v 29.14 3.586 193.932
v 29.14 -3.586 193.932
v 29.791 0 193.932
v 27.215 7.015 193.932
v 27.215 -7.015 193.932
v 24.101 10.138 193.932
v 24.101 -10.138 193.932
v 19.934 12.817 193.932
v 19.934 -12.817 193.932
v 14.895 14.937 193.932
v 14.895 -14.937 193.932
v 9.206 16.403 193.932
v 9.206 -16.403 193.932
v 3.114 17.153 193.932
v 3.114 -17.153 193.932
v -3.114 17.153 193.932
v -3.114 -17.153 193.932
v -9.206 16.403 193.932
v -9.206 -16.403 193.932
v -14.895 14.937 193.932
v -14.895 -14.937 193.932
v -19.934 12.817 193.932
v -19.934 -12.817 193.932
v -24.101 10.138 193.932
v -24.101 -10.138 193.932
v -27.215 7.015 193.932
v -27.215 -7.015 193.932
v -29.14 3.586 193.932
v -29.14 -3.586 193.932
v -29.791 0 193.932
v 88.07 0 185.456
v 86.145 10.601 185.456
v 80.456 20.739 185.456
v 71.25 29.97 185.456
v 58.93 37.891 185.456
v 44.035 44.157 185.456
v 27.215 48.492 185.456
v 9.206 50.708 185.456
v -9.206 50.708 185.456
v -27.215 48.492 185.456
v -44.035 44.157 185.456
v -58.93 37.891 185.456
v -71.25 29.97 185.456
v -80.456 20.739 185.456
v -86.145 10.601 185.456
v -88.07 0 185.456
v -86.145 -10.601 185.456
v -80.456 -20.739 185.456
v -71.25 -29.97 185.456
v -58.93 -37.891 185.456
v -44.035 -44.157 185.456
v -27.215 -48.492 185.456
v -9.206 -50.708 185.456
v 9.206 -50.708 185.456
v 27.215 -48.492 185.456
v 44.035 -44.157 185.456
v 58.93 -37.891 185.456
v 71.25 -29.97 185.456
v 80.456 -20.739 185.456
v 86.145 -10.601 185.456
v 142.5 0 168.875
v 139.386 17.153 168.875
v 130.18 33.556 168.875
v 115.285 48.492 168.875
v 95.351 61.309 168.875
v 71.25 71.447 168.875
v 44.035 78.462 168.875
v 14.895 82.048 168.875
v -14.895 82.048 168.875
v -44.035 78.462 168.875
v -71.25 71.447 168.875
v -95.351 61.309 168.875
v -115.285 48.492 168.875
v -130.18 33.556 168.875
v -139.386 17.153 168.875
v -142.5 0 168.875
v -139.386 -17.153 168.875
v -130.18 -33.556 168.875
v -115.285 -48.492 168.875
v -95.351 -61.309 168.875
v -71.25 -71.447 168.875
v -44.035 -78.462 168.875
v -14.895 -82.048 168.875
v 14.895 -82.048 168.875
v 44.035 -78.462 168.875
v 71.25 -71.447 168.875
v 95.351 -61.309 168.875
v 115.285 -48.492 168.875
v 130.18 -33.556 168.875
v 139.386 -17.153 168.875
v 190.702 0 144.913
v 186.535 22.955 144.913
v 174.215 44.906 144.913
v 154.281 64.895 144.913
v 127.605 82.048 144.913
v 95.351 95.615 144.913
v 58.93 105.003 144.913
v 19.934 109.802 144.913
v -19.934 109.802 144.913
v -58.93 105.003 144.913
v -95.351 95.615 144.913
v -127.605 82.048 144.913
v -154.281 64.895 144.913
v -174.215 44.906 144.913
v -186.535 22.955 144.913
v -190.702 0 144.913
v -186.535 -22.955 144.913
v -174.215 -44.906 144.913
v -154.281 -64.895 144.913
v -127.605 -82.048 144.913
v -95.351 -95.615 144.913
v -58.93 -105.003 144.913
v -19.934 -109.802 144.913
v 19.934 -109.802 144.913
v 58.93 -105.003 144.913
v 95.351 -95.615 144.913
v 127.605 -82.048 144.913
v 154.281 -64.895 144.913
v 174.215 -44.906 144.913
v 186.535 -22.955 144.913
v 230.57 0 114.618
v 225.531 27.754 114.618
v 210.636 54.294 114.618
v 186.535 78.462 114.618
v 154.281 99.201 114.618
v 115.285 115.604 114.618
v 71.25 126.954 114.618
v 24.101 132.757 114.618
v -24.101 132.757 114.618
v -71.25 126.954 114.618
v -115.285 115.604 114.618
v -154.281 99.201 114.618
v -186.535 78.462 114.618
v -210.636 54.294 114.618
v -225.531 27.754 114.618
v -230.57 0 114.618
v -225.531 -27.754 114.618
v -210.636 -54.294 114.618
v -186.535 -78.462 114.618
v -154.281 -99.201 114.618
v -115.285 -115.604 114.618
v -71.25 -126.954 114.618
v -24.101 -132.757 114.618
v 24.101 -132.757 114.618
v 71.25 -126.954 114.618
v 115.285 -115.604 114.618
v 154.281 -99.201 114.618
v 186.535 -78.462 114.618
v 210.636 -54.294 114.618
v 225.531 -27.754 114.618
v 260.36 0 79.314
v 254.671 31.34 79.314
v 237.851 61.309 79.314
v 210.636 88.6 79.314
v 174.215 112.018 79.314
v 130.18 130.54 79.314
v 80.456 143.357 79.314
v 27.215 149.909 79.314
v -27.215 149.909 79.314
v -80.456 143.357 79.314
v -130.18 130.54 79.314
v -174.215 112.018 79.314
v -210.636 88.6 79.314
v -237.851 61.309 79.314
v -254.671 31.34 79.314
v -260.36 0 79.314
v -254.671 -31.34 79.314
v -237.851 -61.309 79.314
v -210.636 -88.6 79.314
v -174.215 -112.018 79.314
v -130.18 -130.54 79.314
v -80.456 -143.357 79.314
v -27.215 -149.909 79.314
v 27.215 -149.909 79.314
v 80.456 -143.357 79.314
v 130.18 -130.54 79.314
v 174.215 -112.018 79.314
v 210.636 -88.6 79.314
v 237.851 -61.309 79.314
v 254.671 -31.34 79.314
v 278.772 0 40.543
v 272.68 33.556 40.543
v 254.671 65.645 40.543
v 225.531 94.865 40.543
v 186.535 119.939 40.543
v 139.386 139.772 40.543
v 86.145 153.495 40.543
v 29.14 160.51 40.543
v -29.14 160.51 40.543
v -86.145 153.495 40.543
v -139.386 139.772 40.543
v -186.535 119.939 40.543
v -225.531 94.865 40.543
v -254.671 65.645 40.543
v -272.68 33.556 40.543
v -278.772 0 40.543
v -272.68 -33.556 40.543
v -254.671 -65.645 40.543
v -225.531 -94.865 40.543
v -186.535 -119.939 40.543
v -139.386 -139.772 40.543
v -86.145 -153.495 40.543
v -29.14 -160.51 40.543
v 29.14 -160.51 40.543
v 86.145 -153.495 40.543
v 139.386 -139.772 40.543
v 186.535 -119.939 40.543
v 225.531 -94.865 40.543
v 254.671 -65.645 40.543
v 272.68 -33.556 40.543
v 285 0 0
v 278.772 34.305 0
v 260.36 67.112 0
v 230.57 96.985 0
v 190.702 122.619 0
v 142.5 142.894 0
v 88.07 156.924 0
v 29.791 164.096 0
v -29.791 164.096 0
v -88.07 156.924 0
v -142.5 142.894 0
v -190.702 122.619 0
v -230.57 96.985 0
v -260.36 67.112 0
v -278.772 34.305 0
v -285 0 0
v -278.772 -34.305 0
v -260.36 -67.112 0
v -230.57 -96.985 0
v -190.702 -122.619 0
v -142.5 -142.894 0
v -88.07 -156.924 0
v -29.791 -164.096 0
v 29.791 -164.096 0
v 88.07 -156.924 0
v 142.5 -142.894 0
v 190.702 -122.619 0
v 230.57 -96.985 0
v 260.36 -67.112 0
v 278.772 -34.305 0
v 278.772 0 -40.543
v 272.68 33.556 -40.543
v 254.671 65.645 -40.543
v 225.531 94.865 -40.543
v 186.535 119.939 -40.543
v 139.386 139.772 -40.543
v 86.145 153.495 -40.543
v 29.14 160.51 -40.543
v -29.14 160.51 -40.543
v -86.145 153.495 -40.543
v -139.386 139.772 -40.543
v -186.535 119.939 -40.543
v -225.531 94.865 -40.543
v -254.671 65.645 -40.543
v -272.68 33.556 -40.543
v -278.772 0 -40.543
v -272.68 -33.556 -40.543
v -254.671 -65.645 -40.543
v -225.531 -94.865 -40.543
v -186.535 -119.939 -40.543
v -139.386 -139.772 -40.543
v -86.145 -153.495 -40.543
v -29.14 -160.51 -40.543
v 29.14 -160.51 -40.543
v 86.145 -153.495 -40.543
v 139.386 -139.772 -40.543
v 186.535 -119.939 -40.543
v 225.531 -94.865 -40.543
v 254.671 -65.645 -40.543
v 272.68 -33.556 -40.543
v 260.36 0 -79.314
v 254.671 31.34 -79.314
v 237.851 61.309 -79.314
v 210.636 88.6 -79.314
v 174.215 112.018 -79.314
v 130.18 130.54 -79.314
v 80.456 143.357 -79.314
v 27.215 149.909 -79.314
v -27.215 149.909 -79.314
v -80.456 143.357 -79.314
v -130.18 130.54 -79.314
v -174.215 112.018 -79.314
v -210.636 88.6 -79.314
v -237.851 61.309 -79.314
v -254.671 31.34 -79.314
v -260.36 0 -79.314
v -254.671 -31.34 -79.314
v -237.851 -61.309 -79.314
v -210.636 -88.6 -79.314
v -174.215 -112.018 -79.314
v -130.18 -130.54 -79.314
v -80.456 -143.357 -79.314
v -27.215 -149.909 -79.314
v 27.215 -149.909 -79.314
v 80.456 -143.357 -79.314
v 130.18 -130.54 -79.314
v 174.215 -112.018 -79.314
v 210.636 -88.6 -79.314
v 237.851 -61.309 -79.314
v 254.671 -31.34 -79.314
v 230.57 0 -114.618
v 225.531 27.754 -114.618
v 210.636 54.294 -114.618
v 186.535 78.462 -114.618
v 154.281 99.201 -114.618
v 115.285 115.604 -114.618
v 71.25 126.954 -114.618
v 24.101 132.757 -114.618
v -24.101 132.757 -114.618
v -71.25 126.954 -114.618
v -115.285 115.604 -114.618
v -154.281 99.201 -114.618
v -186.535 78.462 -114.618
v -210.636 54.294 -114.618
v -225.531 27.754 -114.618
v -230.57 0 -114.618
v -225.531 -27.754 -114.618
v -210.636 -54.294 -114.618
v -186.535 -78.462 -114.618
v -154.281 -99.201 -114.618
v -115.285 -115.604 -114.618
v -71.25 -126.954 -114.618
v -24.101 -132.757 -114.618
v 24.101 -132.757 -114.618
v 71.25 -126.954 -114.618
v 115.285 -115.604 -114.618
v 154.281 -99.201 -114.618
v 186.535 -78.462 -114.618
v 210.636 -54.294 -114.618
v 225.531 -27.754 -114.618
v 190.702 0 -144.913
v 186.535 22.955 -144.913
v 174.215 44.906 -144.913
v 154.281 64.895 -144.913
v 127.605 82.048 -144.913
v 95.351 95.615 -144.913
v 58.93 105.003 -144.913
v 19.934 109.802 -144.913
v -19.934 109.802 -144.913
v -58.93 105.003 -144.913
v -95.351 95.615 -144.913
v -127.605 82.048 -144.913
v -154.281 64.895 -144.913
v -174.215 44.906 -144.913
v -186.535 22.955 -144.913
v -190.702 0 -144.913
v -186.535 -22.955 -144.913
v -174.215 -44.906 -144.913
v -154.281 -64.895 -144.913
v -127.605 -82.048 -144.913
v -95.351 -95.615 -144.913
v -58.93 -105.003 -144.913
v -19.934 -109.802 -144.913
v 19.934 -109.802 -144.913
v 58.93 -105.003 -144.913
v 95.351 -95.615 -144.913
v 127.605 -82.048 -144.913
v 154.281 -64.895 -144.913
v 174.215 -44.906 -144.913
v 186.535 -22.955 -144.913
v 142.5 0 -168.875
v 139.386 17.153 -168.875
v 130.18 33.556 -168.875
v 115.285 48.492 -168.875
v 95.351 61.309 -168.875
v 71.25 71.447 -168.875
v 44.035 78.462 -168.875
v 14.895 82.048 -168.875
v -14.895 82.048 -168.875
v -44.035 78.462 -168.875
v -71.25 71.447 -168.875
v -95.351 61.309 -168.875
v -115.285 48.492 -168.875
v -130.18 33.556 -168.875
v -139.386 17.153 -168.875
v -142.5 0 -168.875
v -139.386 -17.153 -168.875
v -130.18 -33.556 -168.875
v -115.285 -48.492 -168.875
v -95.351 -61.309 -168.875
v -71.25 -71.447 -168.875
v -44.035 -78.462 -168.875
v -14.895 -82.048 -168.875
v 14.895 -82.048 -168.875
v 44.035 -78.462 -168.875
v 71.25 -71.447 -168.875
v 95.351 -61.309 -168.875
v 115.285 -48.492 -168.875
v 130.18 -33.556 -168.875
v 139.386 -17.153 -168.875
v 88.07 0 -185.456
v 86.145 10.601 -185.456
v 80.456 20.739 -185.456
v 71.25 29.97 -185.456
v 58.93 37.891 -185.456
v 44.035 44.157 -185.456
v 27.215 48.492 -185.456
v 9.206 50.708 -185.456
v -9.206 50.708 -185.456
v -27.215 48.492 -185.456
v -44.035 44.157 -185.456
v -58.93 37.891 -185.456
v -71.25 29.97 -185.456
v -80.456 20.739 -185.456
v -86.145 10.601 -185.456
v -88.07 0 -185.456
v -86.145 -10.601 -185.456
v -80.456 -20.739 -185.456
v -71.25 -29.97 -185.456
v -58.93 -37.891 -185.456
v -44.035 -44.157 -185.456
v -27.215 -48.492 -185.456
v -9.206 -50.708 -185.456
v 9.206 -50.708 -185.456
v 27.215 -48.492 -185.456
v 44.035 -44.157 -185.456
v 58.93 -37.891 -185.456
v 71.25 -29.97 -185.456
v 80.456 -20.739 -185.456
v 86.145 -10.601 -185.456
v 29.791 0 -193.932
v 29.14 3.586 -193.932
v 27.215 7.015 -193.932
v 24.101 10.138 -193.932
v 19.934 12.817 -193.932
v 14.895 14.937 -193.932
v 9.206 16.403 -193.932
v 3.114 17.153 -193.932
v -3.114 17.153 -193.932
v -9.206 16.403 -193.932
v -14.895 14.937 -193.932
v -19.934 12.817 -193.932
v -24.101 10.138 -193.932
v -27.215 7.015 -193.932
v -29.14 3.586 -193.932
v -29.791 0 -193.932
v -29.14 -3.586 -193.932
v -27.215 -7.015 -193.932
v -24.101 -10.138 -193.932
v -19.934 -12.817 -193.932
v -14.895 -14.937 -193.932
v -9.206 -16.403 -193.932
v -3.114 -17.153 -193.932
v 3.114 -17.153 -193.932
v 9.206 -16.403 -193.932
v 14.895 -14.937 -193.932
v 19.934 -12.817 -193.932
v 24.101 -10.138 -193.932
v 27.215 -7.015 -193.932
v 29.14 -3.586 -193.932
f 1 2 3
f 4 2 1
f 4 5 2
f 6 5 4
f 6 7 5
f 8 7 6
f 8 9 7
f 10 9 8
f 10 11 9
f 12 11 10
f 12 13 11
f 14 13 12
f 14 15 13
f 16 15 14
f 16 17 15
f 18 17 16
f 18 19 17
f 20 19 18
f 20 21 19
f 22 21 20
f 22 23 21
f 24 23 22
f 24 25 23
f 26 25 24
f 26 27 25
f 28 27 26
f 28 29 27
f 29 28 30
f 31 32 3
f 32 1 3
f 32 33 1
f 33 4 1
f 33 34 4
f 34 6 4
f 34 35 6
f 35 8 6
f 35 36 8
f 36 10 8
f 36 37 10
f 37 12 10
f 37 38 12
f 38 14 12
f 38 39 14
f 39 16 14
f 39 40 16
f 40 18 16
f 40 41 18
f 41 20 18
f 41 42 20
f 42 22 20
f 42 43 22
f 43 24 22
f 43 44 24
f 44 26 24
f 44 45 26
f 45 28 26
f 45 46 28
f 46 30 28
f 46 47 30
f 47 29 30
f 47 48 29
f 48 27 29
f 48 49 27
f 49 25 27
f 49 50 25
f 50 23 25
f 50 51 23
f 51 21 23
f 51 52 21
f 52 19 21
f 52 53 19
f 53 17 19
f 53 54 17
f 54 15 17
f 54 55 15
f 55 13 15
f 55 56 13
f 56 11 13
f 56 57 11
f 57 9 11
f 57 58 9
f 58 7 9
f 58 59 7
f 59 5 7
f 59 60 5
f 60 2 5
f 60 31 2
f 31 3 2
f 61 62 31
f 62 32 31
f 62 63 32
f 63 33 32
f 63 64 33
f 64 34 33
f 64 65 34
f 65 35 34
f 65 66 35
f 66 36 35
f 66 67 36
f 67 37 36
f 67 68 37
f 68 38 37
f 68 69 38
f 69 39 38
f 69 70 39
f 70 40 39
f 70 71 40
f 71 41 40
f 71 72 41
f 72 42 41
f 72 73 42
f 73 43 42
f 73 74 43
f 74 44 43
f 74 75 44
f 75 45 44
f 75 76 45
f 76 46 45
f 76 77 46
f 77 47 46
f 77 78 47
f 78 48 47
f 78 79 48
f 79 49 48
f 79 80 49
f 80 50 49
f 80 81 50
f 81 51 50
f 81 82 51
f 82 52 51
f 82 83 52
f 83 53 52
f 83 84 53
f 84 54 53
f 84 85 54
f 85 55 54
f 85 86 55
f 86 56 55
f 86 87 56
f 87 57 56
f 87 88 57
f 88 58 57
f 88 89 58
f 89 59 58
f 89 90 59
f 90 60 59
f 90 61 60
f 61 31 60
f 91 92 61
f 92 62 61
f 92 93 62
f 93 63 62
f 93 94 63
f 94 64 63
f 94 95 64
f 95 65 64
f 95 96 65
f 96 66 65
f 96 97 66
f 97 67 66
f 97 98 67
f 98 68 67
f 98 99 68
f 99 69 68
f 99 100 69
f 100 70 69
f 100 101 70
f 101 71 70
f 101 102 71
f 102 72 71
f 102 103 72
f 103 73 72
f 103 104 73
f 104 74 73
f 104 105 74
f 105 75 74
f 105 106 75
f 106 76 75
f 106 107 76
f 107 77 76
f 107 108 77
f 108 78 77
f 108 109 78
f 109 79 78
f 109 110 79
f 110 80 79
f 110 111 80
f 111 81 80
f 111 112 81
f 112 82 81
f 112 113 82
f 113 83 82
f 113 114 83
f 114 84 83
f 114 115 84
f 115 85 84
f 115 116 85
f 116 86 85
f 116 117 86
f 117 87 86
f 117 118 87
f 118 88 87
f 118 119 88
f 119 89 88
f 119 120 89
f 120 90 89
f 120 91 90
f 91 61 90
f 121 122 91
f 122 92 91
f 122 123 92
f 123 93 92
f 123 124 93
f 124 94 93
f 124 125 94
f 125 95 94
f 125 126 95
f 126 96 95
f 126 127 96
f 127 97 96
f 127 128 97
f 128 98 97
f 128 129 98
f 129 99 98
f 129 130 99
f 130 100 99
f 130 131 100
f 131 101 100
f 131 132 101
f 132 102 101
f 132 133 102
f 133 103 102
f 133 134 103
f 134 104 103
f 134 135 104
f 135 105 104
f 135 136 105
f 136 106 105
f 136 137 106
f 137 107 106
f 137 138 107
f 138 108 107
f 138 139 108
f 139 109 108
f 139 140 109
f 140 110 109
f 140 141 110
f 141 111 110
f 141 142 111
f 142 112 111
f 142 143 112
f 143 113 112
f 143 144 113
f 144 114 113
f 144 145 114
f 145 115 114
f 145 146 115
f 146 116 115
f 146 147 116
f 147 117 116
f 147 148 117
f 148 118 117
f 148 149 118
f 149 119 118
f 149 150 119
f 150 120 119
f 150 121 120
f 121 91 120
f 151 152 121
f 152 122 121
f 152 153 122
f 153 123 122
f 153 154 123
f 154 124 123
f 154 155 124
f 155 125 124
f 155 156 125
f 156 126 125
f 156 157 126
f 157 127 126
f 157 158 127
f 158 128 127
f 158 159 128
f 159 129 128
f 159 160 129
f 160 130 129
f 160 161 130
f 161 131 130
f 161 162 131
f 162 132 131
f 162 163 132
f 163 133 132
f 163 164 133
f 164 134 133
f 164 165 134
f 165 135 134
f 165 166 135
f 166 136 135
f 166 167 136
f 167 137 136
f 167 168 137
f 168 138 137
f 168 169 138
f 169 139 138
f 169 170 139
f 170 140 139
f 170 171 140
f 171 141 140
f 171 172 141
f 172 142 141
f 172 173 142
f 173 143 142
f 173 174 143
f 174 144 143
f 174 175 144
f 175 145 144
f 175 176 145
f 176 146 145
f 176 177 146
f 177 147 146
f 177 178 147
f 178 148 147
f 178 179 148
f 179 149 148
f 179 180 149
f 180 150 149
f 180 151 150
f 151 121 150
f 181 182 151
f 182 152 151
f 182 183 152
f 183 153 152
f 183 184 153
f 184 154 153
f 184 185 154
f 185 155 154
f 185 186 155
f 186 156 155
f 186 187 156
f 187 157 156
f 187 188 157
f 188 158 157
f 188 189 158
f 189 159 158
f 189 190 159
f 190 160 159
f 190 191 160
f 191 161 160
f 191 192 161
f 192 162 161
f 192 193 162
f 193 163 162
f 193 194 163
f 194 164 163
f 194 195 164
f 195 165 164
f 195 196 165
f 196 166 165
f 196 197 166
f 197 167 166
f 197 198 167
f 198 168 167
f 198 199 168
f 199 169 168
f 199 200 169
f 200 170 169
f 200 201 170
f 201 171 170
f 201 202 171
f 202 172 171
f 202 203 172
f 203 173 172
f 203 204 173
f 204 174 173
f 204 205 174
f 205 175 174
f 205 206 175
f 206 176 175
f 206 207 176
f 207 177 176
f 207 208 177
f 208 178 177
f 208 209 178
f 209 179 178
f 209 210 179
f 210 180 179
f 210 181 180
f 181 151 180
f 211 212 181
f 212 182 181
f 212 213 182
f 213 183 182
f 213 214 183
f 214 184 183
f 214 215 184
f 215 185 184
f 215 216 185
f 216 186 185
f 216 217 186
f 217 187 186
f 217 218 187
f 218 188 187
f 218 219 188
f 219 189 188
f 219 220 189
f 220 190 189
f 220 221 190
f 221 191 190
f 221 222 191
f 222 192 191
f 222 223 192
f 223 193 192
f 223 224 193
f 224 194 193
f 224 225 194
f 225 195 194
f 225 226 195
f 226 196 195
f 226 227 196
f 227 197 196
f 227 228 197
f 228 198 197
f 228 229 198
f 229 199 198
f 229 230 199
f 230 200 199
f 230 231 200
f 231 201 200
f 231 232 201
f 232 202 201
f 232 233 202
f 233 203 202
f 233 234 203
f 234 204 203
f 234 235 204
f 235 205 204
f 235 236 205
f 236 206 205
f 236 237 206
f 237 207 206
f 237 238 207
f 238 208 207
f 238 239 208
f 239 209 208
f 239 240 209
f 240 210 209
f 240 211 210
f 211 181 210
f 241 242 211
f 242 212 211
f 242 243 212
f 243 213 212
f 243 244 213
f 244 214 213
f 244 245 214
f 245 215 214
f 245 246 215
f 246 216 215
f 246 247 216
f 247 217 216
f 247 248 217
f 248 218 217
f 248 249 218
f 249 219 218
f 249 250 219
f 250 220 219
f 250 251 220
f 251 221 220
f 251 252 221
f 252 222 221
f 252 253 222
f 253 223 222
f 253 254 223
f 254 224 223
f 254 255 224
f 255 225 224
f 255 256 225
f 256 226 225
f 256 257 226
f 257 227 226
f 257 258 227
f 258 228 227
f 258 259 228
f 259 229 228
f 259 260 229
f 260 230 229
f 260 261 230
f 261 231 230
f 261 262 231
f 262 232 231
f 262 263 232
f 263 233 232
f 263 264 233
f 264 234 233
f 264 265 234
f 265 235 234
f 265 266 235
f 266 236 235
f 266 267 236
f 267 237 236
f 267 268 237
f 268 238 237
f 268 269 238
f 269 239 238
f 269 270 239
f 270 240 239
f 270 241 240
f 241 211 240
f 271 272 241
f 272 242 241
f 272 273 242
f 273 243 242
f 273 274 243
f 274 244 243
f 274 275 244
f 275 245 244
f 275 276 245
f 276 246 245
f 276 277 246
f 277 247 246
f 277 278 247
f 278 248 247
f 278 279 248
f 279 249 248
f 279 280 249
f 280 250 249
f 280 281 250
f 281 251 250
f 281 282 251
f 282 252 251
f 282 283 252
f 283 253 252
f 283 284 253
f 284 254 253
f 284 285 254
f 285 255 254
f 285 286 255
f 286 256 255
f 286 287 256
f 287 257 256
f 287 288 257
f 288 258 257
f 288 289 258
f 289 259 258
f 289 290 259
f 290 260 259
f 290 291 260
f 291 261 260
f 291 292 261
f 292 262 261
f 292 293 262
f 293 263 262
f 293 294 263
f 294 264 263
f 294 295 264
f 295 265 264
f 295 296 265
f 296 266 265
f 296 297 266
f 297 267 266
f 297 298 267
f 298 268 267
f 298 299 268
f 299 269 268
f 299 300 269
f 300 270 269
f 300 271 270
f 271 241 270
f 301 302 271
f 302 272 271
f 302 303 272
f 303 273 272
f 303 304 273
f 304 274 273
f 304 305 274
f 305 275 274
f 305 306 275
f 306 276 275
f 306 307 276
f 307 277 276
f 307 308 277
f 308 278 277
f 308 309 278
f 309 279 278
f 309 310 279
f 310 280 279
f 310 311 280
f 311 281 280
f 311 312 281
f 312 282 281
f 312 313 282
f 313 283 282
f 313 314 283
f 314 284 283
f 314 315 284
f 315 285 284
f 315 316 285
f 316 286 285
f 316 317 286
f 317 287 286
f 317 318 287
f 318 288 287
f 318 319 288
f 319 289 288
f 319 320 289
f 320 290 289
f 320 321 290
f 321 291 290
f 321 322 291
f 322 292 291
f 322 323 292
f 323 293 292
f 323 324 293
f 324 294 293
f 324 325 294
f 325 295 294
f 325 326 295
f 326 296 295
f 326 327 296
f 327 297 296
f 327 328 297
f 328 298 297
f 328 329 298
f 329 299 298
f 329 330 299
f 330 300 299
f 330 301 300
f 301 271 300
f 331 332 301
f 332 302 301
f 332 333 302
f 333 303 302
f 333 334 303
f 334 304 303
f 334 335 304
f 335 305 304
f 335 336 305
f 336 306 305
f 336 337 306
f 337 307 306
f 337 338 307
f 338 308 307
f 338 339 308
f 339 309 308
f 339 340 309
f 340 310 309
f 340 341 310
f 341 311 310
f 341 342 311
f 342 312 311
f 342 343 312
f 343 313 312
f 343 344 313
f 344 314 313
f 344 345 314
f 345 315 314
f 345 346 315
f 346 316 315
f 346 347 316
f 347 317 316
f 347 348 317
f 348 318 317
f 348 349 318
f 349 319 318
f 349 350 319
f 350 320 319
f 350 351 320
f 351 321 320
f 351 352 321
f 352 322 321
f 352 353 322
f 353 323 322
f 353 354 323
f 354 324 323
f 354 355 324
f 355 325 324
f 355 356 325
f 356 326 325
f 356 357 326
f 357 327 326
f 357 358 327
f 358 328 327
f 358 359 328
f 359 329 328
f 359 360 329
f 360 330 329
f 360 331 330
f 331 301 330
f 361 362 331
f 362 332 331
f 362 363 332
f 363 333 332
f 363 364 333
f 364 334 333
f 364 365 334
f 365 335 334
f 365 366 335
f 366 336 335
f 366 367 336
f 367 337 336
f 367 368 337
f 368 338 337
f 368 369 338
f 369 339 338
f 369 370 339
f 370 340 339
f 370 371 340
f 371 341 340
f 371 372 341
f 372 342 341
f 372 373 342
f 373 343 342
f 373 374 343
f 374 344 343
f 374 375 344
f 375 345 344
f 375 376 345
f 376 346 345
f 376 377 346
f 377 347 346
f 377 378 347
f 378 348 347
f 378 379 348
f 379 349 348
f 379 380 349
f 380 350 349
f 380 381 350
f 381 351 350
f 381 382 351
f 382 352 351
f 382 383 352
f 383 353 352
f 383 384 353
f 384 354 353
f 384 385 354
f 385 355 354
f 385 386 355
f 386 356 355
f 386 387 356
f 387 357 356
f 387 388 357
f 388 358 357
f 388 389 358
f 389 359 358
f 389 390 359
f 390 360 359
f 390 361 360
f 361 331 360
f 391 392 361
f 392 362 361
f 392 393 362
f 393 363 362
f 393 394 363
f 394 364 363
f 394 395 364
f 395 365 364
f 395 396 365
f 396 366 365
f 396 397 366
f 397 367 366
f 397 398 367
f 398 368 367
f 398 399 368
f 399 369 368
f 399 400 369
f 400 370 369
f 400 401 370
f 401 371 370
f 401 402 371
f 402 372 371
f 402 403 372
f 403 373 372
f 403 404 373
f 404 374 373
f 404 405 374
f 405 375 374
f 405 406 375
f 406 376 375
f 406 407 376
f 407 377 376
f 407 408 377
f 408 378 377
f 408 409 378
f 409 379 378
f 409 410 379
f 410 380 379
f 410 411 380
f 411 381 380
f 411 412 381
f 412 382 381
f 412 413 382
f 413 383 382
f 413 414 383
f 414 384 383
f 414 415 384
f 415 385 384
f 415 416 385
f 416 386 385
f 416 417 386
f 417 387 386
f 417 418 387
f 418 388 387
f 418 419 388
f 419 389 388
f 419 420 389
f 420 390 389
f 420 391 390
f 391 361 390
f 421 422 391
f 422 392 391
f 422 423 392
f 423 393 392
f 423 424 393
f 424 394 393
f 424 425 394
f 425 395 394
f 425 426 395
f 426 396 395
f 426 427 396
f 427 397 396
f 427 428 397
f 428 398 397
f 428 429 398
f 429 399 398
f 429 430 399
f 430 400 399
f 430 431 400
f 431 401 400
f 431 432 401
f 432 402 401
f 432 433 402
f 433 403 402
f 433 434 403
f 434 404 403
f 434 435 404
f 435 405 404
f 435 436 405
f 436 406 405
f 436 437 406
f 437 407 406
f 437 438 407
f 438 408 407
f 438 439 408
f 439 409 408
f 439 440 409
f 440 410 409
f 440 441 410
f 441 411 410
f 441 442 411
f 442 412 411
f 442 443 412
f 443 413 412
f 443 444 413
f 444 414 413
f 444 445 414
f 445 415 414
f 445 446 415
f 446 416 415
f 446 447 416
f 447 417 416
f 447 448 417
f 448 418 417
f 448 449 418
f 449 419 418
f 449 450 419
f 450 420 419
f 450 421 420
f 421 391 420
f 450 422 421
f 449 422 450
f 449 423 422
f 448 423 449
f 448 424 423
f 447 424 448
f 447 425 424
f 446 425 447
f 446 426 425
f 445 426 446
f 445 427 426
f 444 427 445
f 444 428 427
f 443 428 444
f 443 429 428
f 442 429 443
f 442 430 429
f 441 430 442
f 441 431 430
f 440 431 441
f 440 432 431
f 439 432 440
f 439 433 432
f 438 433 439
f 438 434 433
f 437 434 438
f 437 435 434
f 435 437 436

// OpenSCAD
// Generated by SolidPython 1.0.1 on 2020-07-29 00:46:54


scale(v = [19, 11, 13]) {
	sphere(r = 15);
}
/***********************************************
*********      SolidPython code:      **********
************************************************
 
# import packages: SolidPython
from solid import *
from solid.utils import *
from itertools import chain, combinations, permutations


class Resize:

    def __init__(self, scad_file):
        self.scad_file = scad_file
        #self.scad_file = import_scad(scad_file)
        # cone/cylinder param:
        self.r1 = 0
        self.r2 = 0
        self.h = 0
        # rectangular prism param:
        self.w = 0
        self.l = 0
        # ellipse param:
        self.r = 0

    # import OpenScad code (file name corresponds to shape)


    # classify shape + parameters
    def assign(self, param1, param2, param3):
        if self.scad_file == 'cone.scad':
            self.r1 = param1
            self.r2 = param2
            self.h = param3
        elif self.scad_file == 'cylinder.scad':
            self.r1 = param1
            self.r2 = param2
            self.h = param3
        elif self.scad_file == 'rectangularPrism.scad':
            self.h = param1
            self.l = param2
            self.w = param3
        else:
            self.r = param1
            self.h = param2

    # resize parameters
    def iterate(self):
        x = range(3, 20, 2)
        i = 1
        if self.scad_file == 'cone.scad':
            tempList = list(permutations(x, 2))
            for temp in tempList:
                param1 = temp[0]
                param2 = temp[1]
                filepath = 'produced_scad_files/' + 'cone' + str(param1) + '_' + str(param2) + '_' + '.scad'
                scad_render_to_file(cylinder(h=param1, r1=param2, r2=0), filepath)

        elif self.scad_file == 'cylinder.scad':
            tempList = list(permutations(x, 3))
            for temp in tempList:
                param1 = temp[0]
                param2 = temp[1]
                filepath = 'produced_scad_files/' + 'cylinder' + str(param1) + '_' + str(param2) + '_' + '.scad'
                scad_render_to_file(cylinder(h=param1, r1=param2, r2=param2), filepath)

        elif self.scad_file == 'rectangularPrism.scad':
            tempList = list(permutations(x, 3))
            for temp in tempList:
                param1 = temp[0]
                param2 = temp[1]
                param3 = temp[2]
                filepath = 'produced_scad_files/' + 'rectangularPrism' + str(param1) + '_' + str(param2) + '_' + str(
                    param3) + '.scad'
                scad_render_to_file(cube(size=(param1, param2, param3)), filepath)

        elif self.scad_file == 'ellipse.scad':
            tempList = list(permutations(x, 4))
            for temp in tempList:
                param1 = temp[0]
                param2 = temp[1]
                param3 = temp[2]
                param4 = temp[3]
                filepath = 'produced_scad_files/' + 'ellipse' + str(param1) + '_' + str(param2) + '_' + str(param3) + '_' + str(param4) + '.scad'
                scad_render_to_file(scale([param1, param2, param3])(sphere(r=param4)), filepath)

    def render_to_scadfile(self):
        scad_render_to_file(scad, 'example.scad') 
 
************************************************/
